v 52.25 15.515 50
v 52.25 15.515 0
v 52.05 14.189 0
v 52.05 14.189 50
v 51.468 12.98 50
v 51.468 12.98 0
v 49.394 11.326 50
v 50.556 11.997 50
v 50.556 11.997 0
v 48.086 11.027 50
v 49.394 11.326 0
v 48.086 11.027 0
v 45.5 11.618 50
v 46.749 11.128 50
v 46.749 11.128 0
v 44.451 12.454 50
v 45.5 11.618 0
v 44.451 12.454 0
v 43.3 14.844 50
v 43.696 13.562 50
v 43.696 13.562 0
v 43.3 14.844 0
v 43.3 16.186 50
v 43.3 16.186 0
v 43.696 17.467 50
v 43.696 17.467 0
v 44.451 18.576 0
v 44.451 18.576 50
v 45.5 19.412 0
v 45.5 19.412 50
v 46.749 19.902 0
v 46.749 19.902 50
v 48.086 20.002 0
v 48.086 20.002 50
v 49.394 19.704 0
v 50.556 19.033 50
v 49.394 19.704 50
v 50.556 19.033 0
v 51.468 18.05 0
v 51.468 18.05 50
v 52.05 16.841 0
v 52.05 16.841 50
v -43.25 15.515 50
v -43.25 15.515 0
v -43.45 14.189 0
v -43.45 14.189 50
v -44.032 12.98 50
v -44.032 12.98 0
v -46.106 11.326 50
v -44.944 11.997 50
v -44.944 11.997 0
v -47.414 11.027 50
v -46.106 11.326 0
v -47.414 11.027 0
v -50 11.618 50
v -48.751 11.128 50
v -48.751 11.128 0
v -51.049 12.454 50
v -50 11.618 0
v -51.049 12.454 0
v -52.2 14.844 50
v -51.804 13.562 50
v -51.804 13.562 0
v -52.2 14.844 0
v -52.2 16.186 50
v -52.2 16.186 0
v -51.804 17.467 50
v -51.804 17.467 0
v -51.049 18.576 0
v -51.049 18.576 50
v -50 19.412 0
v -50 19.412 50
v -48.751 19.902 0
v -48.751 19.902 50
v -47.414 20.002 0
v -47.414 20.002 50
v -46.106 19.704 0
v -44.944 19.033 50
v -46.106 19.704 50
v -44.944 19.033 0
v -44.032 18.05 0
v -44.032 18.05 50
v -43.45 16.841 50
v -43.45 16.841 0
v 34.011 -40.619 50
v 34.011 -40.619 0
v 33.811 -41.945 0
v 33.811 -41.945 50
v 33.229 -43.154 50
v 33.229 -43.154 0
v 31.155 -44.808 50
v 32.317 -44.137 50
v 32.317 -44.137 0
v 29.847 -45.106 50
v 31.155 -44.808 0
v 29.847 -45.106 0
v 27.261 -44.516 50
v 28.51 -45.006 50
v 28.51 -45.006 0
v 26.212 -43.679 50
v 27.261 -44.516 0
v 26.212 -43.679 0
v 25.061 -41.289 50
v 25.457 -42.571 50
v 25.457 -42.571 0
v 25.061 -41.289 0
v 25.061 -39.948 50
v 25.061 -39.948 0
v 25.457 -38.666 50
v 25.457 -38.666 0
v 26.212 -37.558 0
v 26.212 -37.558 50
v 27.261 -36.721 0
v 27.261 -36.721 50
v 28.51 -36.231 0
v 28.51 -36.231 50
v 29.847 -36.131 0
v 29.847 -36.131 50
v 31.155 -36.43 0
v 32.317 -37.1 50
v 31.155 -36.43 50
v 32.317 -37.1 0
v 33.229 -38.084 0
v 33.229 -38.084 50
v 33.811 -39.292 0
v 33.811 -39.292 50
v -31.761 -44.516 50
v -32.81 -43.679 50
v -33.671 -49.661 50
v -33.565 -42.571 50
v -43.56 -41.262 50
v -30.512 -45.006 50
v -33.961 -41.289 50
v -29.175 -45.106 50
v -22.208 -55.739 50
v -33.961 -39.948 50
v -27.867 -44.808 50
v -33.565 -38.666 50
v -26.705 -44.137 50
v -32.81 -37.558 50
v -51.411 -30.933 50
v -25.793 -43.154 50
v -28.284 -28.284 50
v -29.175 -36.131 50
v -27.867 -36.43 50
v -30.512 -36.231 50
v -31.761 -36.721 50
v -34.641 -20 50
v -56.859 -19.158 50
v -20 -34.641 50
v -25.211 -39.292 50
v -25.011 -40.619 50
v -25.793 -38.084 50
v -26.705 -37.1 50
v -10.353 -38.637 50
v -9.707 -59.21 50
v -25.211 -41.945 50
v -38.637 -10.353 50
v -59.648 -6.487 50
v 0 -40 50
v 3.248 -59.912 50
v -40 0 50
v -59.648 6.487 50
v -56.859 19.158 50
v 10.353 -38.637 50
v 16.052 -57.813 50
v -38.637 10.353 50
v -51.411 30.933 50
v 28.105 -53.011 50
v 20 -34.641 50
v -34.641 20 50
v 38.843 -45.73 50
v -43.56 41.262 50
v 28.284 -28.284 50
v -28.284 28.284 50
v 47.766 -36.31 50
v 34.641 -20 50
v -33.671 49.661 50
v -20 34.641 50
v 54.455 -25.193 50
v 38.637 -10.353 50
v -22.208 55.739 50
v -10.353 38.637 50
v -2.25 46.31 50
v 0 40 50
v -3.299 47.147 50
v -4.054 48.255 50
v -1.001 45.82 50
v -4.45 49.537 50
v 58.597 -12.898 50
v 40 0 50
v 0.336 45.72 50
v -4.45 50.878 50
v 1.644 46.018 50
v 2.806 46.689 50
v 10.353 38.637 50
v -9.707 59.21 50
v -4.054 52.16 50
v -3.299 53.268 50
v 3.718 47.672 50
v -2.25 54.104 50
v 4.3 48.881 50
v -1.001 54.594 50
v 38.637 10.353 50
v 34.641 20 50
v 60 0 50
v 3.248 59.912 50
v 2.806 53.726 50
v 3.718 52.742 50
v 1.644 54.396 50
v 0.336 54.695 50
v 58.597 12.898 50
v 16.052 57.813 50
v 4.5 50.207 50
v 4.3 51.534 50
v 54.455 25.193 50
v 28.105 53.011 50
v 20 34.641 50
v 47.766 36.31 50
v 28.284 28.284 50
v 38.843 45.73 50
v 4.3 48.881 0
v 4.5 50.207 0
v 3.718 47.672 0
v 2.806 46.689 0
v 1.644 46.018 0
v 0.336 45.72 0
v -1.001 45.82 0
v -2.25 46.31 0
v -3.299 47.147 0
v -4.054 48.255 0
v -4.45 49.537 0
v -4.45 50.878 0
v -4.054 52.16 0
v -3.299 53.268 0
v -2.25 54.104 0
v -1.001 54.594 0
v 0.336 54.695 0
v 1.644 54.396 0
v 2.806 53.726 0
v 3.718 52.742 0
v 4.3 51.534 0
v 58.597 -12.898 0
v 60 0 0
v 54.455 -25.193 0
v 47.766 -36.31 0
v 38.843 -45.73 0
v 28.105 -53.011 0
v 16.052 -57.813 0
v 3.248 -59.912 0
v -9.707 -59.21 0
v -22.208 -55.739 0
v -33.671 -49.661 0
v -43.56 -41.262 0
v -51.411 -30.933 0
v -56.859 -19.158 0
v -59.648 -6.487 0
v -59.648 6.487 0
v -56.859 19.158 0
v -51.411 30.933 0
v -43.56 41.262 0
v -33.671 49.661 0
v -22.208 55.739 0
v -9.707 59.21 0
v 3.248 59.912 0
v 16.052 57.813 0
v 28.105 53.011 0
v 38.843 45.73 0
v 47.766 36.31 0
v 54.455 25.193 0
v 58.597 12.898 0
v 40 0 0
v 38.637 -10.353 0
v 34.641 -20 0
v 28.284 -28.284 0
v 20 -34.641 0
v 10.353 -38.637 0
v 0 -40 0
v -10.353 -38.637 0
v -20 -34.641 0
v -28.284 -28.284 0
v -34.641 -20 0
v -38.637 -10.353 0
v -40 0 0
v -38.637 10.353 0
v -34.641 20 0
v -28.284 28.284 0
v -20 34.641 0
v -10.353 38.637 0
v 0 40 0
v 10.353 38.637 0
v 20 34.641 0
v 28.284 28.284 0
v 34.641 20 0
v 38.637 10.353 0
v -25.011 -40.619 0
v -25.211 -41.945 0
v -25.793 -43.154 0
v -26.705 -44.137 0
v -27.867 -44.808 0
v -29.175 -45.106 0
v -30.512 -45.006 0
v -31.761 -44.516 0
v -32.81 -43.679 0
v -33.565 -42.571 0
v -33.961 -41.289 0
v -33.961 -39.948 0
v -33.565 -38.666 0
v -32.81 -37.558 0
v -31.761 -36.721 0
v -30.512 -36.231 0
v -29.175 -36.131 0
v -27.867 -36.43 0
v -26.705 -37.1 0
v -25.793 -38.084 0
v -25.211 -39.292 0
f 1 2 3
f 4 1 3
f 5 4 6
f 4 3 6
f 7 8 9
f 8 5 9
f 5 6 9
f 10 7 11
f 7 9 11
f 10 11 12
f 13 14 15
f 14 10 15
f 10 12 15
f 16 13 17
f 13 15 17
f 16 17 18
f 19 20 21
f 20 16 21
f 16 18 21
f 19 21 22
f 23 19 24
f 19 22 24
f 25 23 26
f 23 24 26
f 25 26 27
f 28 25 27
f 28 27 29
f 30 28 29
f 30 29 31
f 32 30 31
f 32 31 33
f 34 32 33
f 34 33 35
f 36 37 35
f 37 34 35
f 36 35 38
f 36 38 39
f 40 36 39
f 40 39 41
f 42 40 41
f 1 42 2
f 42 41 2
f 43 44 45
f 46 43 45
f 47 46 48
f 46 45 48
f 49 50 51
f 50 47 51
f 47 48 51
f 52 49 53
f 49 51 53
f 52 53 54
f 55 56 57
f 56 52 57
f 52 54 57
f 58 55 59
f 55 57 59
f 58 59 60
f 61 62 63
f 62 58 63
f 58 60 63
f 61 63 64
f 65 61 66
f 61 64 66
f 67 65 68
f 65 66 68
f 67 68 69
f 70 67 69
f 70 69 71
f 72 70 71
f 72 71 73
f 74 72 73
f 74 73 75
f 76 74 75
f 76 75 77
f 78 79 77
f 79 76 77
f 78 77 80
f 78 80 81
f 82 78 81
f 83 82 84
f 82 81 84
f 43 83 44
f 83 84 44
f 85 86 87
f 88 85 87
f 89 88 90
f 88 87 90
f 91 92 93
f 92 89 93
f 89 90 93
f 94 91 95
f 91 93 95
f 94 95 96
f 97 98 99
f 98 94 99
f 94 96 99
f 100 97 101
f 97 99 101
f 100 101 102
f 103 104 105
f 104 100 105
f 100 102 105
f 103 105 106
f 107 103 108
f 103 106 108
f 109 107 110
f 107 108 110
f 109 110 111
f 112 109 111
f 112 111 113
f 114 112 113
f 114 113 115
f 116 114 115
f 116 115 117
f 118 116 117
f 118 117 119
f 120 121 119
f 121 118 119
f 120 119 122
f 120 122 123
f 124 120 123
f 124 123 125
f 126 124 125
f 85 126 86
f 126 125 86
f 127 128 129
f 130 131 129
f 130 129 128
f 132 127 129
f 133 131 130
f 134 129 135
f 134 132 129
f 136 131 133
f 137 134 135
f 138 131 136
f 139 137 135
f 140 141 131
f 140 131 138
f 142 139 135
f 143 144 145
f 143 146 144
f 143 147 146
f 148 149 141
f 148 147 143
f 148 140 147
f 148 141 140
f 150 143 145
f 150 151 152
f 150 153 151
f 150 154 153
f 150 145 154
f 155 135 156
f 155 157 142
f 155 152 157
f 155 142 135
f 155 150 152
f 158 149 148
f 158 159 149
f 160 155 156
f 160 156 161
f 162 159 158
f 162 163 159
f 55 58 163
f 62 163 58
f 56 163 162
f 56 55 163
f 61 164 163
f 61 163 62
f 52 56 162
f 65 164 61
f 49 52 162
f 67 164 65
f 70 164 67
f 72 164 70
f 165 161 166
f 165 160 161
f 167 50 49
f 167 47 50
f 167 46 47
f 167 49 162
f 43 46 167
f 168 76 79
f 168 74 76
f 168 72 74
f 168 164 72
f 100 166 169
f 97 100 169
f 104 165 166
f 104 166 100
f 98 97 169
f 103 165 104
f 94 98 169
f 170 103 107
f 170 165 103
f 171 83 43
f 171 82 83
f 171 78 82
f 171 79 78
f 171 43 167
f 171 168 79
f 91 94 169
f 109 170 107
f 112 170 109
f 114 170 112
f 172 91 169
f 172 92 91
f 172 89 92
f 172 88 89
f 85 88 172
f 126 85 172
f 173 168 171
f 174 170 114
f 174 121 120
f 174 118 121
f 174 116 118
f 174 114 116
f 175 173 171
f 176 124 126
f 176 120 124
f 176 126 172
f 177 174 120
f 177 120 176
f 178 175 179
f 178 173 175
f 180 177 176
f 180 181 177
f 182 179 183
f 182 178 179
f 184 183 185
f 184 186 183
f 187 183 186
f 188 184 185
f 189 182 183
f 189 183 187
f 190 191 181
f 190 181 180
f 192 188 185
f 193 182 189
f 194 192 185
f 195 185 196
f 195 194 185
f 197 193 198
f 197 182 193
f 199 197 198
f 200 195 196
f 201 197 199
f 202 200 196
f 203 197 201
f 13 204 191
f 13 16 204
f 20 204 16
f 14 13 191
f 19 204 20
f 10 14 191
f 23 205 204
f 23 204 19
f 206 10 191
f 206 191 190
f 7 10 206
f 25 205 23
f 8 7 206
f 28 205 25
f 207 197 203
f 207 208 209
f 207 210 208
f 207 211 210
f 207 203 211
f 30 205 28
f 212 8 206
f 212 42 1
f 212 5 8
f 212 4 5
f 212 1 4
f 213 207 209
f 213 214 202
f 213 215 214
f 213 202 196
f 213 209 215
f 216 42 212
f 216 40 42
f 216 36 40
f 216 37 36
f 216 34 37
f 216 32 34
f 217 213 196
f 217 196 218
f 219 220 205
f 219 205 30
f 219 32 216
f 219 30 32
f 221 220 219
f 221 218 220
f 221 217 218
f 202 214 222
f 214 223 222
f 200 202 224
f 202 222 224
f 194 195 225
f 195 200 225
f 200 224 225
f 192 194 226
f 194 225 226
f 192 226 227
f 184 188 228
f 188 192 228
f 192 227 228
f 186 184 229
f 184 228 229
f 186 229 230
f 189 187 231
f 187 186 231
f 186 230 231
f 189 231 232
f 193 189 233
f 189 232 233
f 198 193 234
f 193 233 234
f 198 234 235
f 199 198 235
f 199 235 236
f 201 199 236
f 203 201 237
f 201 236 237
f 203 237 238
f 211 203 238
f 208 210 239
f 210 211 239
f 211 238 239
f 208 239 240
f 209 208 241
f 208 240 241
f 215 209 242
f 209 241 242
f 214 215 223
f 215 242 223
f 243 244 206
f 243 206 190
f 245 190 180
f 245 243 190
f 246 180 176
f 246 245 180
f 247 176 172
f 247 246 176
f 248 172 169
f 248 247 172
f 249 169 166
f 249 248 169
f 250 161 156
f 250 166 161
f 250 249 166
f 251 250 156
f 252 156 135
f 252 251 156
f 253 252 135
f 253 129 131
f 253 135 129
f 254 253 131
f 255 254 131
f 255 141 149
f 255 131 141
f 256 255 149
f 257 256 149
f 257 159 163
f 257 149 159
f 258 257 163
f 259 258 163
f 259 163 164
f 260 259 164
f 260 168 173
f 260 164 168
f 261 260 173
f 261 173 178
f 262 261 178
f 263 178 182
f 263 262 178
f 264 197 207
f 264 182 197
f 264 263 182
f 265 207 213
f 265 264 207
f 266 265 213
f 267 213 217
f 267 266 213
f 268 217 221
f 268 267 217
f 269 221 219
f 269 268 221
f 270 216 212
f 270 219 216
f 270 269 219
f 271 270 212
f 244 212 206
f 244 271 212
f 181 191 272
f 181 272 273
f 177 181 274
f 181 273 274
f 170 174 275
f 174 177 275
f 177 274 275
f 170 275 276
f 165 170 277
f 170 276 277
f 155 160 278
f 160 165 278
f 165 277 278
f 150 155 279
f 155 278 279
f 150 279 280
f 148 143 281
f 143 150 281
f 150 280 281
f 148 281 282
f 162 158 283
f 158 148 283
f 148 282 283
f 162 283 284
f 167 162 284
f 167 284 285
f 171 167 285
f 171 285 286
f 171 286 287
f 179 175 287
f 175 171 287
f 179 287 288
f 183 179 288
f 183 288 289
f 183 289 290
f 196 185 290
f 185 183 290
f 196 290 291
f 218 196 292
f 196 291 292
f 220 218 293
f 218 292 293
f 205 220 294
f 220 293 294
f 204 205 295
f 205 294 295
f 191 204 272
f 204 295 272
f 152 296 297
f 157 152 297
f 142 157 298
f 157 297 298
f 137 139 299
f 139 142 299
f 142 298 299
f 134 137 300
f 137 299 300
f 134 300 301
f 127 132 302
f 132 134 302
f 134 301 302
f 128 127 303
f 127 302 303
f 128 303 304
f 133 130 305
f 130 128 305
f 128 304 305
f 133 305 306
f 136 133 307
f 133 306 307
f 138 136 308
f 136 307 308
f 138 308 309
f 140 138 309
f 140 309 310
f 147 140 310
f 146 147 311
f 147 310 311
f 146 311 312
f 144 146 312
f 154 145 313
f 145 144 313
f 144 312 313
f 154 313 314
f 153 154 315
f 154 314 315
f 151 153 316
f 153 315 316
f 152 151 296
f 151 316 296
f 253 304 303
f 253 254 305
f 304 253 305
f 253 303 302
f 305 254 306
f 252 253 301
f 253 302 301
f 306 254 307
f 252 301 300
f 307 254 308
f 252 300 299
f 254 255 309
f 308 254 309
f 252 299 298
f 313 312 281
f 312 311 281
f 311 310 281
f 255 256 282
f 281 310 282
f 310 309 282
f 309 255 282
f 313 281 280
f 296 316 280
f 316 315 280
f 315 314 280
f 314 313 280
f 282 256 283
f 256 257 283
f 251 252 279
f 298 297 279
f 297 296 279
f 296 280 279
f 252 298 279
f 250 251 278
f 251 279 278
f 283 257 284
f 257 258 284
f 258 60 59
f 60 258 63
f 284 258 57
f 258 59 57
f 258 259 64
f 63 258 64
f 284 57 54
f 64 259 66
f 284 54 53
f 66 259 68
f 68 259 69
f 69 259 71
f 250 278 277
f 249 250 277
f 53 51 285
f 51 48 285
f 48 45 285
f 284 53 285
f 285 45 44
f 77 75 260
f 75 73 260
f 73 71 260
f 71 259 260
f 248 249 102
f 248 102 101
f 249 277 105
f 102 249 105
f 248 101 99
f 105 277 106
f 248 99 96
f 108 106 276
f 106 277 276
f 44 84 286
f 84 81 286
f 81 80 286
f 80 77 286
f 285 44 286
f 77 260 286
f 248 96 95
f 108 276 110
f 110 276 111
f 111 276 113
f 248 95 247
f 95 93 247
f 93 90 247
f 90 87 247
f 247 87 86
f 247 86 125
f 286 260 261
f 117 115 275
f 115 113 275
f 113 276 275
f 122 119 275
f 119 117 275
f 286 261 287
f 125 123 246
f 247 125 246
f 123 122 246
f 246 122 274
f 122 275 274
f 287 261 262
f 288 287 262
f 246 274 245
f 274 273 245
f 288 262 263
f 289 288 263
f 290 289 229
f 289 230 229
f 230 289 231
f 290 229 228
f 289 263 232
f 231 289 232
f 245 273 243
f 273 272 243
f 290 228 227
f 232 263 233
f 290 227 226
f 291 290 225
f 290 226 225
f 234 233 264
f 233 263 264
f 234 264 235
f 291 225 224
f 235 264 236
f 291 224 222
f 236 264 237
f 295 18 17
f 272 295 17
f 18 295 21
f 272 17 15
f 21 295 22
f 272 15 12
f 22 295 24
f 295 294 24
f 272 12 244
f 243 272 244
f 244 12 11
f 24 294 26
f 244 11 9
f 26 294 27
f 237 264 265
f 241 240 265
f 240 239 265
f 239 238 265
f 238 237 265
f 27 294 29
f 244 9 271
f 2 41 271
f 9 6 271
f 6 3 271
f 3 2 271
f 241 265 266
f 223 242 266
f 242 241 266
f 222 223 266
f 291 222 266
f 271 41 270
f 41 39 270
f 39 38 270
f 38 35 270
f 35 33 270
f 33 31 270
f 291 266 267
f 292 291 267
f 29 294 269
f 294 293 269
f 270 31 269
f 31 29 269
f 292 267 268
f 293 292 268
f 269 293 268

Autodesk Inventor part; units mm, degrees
ref_plane "YZ Plane" through (0, 0, 0) normal (1, 0, 0) x (0, 1, 0)
ref_plane "XZ Plane" through (0, 0, 0) normal (0, 1, 0) x (-1, 0, 0)
ref_plane "XY Plane" through (0, 0, 0) normal (0, 0, 1) x (1, 0, 0)
sketch "Sketch1" plane through (0, 0, 0) normal (0, 0, 1) x (1, 0, 0)
  line L0 (0, 50.2073) -> (47.75, 15.5149) construction
  line L1 (47.75, 15.5149) -> (29.5111, -40.6186) construction
  line L2 (29.5111, -40.6186) -> (-29.5111, -40.6186) construction
  line L3 (-29.5111, -40.6186) -> (-47.75, 15.5149) construction
  line L4 (-47.75, 15.5149) -> (0, 50.2073) construction
  circle A0 centre (0, 50.2073) radius 4.5
  circle A1 centre (47.75, 15.5149) radius 4.5
  circle A2 centre (29.5111, -40.6186) radius 4.5
  circle A3 centre (-29.5111, -40.6186) radius 4.5
  circle A4 centre (-47.75, 15.5149) radius 4.5
  circle A5 centre (0, 0) radius 40
  circle A6 centre (0, 0) radius 60
  dimension "d0" = 95.5
  dimension "d1" = 9
  dimension "d2" = 80
  dimension "d3" = 120
extrude "Extrusion1" add sketch "Sketch1" along normal blind 50
properties part number "drive wheel sprocket spacer"
